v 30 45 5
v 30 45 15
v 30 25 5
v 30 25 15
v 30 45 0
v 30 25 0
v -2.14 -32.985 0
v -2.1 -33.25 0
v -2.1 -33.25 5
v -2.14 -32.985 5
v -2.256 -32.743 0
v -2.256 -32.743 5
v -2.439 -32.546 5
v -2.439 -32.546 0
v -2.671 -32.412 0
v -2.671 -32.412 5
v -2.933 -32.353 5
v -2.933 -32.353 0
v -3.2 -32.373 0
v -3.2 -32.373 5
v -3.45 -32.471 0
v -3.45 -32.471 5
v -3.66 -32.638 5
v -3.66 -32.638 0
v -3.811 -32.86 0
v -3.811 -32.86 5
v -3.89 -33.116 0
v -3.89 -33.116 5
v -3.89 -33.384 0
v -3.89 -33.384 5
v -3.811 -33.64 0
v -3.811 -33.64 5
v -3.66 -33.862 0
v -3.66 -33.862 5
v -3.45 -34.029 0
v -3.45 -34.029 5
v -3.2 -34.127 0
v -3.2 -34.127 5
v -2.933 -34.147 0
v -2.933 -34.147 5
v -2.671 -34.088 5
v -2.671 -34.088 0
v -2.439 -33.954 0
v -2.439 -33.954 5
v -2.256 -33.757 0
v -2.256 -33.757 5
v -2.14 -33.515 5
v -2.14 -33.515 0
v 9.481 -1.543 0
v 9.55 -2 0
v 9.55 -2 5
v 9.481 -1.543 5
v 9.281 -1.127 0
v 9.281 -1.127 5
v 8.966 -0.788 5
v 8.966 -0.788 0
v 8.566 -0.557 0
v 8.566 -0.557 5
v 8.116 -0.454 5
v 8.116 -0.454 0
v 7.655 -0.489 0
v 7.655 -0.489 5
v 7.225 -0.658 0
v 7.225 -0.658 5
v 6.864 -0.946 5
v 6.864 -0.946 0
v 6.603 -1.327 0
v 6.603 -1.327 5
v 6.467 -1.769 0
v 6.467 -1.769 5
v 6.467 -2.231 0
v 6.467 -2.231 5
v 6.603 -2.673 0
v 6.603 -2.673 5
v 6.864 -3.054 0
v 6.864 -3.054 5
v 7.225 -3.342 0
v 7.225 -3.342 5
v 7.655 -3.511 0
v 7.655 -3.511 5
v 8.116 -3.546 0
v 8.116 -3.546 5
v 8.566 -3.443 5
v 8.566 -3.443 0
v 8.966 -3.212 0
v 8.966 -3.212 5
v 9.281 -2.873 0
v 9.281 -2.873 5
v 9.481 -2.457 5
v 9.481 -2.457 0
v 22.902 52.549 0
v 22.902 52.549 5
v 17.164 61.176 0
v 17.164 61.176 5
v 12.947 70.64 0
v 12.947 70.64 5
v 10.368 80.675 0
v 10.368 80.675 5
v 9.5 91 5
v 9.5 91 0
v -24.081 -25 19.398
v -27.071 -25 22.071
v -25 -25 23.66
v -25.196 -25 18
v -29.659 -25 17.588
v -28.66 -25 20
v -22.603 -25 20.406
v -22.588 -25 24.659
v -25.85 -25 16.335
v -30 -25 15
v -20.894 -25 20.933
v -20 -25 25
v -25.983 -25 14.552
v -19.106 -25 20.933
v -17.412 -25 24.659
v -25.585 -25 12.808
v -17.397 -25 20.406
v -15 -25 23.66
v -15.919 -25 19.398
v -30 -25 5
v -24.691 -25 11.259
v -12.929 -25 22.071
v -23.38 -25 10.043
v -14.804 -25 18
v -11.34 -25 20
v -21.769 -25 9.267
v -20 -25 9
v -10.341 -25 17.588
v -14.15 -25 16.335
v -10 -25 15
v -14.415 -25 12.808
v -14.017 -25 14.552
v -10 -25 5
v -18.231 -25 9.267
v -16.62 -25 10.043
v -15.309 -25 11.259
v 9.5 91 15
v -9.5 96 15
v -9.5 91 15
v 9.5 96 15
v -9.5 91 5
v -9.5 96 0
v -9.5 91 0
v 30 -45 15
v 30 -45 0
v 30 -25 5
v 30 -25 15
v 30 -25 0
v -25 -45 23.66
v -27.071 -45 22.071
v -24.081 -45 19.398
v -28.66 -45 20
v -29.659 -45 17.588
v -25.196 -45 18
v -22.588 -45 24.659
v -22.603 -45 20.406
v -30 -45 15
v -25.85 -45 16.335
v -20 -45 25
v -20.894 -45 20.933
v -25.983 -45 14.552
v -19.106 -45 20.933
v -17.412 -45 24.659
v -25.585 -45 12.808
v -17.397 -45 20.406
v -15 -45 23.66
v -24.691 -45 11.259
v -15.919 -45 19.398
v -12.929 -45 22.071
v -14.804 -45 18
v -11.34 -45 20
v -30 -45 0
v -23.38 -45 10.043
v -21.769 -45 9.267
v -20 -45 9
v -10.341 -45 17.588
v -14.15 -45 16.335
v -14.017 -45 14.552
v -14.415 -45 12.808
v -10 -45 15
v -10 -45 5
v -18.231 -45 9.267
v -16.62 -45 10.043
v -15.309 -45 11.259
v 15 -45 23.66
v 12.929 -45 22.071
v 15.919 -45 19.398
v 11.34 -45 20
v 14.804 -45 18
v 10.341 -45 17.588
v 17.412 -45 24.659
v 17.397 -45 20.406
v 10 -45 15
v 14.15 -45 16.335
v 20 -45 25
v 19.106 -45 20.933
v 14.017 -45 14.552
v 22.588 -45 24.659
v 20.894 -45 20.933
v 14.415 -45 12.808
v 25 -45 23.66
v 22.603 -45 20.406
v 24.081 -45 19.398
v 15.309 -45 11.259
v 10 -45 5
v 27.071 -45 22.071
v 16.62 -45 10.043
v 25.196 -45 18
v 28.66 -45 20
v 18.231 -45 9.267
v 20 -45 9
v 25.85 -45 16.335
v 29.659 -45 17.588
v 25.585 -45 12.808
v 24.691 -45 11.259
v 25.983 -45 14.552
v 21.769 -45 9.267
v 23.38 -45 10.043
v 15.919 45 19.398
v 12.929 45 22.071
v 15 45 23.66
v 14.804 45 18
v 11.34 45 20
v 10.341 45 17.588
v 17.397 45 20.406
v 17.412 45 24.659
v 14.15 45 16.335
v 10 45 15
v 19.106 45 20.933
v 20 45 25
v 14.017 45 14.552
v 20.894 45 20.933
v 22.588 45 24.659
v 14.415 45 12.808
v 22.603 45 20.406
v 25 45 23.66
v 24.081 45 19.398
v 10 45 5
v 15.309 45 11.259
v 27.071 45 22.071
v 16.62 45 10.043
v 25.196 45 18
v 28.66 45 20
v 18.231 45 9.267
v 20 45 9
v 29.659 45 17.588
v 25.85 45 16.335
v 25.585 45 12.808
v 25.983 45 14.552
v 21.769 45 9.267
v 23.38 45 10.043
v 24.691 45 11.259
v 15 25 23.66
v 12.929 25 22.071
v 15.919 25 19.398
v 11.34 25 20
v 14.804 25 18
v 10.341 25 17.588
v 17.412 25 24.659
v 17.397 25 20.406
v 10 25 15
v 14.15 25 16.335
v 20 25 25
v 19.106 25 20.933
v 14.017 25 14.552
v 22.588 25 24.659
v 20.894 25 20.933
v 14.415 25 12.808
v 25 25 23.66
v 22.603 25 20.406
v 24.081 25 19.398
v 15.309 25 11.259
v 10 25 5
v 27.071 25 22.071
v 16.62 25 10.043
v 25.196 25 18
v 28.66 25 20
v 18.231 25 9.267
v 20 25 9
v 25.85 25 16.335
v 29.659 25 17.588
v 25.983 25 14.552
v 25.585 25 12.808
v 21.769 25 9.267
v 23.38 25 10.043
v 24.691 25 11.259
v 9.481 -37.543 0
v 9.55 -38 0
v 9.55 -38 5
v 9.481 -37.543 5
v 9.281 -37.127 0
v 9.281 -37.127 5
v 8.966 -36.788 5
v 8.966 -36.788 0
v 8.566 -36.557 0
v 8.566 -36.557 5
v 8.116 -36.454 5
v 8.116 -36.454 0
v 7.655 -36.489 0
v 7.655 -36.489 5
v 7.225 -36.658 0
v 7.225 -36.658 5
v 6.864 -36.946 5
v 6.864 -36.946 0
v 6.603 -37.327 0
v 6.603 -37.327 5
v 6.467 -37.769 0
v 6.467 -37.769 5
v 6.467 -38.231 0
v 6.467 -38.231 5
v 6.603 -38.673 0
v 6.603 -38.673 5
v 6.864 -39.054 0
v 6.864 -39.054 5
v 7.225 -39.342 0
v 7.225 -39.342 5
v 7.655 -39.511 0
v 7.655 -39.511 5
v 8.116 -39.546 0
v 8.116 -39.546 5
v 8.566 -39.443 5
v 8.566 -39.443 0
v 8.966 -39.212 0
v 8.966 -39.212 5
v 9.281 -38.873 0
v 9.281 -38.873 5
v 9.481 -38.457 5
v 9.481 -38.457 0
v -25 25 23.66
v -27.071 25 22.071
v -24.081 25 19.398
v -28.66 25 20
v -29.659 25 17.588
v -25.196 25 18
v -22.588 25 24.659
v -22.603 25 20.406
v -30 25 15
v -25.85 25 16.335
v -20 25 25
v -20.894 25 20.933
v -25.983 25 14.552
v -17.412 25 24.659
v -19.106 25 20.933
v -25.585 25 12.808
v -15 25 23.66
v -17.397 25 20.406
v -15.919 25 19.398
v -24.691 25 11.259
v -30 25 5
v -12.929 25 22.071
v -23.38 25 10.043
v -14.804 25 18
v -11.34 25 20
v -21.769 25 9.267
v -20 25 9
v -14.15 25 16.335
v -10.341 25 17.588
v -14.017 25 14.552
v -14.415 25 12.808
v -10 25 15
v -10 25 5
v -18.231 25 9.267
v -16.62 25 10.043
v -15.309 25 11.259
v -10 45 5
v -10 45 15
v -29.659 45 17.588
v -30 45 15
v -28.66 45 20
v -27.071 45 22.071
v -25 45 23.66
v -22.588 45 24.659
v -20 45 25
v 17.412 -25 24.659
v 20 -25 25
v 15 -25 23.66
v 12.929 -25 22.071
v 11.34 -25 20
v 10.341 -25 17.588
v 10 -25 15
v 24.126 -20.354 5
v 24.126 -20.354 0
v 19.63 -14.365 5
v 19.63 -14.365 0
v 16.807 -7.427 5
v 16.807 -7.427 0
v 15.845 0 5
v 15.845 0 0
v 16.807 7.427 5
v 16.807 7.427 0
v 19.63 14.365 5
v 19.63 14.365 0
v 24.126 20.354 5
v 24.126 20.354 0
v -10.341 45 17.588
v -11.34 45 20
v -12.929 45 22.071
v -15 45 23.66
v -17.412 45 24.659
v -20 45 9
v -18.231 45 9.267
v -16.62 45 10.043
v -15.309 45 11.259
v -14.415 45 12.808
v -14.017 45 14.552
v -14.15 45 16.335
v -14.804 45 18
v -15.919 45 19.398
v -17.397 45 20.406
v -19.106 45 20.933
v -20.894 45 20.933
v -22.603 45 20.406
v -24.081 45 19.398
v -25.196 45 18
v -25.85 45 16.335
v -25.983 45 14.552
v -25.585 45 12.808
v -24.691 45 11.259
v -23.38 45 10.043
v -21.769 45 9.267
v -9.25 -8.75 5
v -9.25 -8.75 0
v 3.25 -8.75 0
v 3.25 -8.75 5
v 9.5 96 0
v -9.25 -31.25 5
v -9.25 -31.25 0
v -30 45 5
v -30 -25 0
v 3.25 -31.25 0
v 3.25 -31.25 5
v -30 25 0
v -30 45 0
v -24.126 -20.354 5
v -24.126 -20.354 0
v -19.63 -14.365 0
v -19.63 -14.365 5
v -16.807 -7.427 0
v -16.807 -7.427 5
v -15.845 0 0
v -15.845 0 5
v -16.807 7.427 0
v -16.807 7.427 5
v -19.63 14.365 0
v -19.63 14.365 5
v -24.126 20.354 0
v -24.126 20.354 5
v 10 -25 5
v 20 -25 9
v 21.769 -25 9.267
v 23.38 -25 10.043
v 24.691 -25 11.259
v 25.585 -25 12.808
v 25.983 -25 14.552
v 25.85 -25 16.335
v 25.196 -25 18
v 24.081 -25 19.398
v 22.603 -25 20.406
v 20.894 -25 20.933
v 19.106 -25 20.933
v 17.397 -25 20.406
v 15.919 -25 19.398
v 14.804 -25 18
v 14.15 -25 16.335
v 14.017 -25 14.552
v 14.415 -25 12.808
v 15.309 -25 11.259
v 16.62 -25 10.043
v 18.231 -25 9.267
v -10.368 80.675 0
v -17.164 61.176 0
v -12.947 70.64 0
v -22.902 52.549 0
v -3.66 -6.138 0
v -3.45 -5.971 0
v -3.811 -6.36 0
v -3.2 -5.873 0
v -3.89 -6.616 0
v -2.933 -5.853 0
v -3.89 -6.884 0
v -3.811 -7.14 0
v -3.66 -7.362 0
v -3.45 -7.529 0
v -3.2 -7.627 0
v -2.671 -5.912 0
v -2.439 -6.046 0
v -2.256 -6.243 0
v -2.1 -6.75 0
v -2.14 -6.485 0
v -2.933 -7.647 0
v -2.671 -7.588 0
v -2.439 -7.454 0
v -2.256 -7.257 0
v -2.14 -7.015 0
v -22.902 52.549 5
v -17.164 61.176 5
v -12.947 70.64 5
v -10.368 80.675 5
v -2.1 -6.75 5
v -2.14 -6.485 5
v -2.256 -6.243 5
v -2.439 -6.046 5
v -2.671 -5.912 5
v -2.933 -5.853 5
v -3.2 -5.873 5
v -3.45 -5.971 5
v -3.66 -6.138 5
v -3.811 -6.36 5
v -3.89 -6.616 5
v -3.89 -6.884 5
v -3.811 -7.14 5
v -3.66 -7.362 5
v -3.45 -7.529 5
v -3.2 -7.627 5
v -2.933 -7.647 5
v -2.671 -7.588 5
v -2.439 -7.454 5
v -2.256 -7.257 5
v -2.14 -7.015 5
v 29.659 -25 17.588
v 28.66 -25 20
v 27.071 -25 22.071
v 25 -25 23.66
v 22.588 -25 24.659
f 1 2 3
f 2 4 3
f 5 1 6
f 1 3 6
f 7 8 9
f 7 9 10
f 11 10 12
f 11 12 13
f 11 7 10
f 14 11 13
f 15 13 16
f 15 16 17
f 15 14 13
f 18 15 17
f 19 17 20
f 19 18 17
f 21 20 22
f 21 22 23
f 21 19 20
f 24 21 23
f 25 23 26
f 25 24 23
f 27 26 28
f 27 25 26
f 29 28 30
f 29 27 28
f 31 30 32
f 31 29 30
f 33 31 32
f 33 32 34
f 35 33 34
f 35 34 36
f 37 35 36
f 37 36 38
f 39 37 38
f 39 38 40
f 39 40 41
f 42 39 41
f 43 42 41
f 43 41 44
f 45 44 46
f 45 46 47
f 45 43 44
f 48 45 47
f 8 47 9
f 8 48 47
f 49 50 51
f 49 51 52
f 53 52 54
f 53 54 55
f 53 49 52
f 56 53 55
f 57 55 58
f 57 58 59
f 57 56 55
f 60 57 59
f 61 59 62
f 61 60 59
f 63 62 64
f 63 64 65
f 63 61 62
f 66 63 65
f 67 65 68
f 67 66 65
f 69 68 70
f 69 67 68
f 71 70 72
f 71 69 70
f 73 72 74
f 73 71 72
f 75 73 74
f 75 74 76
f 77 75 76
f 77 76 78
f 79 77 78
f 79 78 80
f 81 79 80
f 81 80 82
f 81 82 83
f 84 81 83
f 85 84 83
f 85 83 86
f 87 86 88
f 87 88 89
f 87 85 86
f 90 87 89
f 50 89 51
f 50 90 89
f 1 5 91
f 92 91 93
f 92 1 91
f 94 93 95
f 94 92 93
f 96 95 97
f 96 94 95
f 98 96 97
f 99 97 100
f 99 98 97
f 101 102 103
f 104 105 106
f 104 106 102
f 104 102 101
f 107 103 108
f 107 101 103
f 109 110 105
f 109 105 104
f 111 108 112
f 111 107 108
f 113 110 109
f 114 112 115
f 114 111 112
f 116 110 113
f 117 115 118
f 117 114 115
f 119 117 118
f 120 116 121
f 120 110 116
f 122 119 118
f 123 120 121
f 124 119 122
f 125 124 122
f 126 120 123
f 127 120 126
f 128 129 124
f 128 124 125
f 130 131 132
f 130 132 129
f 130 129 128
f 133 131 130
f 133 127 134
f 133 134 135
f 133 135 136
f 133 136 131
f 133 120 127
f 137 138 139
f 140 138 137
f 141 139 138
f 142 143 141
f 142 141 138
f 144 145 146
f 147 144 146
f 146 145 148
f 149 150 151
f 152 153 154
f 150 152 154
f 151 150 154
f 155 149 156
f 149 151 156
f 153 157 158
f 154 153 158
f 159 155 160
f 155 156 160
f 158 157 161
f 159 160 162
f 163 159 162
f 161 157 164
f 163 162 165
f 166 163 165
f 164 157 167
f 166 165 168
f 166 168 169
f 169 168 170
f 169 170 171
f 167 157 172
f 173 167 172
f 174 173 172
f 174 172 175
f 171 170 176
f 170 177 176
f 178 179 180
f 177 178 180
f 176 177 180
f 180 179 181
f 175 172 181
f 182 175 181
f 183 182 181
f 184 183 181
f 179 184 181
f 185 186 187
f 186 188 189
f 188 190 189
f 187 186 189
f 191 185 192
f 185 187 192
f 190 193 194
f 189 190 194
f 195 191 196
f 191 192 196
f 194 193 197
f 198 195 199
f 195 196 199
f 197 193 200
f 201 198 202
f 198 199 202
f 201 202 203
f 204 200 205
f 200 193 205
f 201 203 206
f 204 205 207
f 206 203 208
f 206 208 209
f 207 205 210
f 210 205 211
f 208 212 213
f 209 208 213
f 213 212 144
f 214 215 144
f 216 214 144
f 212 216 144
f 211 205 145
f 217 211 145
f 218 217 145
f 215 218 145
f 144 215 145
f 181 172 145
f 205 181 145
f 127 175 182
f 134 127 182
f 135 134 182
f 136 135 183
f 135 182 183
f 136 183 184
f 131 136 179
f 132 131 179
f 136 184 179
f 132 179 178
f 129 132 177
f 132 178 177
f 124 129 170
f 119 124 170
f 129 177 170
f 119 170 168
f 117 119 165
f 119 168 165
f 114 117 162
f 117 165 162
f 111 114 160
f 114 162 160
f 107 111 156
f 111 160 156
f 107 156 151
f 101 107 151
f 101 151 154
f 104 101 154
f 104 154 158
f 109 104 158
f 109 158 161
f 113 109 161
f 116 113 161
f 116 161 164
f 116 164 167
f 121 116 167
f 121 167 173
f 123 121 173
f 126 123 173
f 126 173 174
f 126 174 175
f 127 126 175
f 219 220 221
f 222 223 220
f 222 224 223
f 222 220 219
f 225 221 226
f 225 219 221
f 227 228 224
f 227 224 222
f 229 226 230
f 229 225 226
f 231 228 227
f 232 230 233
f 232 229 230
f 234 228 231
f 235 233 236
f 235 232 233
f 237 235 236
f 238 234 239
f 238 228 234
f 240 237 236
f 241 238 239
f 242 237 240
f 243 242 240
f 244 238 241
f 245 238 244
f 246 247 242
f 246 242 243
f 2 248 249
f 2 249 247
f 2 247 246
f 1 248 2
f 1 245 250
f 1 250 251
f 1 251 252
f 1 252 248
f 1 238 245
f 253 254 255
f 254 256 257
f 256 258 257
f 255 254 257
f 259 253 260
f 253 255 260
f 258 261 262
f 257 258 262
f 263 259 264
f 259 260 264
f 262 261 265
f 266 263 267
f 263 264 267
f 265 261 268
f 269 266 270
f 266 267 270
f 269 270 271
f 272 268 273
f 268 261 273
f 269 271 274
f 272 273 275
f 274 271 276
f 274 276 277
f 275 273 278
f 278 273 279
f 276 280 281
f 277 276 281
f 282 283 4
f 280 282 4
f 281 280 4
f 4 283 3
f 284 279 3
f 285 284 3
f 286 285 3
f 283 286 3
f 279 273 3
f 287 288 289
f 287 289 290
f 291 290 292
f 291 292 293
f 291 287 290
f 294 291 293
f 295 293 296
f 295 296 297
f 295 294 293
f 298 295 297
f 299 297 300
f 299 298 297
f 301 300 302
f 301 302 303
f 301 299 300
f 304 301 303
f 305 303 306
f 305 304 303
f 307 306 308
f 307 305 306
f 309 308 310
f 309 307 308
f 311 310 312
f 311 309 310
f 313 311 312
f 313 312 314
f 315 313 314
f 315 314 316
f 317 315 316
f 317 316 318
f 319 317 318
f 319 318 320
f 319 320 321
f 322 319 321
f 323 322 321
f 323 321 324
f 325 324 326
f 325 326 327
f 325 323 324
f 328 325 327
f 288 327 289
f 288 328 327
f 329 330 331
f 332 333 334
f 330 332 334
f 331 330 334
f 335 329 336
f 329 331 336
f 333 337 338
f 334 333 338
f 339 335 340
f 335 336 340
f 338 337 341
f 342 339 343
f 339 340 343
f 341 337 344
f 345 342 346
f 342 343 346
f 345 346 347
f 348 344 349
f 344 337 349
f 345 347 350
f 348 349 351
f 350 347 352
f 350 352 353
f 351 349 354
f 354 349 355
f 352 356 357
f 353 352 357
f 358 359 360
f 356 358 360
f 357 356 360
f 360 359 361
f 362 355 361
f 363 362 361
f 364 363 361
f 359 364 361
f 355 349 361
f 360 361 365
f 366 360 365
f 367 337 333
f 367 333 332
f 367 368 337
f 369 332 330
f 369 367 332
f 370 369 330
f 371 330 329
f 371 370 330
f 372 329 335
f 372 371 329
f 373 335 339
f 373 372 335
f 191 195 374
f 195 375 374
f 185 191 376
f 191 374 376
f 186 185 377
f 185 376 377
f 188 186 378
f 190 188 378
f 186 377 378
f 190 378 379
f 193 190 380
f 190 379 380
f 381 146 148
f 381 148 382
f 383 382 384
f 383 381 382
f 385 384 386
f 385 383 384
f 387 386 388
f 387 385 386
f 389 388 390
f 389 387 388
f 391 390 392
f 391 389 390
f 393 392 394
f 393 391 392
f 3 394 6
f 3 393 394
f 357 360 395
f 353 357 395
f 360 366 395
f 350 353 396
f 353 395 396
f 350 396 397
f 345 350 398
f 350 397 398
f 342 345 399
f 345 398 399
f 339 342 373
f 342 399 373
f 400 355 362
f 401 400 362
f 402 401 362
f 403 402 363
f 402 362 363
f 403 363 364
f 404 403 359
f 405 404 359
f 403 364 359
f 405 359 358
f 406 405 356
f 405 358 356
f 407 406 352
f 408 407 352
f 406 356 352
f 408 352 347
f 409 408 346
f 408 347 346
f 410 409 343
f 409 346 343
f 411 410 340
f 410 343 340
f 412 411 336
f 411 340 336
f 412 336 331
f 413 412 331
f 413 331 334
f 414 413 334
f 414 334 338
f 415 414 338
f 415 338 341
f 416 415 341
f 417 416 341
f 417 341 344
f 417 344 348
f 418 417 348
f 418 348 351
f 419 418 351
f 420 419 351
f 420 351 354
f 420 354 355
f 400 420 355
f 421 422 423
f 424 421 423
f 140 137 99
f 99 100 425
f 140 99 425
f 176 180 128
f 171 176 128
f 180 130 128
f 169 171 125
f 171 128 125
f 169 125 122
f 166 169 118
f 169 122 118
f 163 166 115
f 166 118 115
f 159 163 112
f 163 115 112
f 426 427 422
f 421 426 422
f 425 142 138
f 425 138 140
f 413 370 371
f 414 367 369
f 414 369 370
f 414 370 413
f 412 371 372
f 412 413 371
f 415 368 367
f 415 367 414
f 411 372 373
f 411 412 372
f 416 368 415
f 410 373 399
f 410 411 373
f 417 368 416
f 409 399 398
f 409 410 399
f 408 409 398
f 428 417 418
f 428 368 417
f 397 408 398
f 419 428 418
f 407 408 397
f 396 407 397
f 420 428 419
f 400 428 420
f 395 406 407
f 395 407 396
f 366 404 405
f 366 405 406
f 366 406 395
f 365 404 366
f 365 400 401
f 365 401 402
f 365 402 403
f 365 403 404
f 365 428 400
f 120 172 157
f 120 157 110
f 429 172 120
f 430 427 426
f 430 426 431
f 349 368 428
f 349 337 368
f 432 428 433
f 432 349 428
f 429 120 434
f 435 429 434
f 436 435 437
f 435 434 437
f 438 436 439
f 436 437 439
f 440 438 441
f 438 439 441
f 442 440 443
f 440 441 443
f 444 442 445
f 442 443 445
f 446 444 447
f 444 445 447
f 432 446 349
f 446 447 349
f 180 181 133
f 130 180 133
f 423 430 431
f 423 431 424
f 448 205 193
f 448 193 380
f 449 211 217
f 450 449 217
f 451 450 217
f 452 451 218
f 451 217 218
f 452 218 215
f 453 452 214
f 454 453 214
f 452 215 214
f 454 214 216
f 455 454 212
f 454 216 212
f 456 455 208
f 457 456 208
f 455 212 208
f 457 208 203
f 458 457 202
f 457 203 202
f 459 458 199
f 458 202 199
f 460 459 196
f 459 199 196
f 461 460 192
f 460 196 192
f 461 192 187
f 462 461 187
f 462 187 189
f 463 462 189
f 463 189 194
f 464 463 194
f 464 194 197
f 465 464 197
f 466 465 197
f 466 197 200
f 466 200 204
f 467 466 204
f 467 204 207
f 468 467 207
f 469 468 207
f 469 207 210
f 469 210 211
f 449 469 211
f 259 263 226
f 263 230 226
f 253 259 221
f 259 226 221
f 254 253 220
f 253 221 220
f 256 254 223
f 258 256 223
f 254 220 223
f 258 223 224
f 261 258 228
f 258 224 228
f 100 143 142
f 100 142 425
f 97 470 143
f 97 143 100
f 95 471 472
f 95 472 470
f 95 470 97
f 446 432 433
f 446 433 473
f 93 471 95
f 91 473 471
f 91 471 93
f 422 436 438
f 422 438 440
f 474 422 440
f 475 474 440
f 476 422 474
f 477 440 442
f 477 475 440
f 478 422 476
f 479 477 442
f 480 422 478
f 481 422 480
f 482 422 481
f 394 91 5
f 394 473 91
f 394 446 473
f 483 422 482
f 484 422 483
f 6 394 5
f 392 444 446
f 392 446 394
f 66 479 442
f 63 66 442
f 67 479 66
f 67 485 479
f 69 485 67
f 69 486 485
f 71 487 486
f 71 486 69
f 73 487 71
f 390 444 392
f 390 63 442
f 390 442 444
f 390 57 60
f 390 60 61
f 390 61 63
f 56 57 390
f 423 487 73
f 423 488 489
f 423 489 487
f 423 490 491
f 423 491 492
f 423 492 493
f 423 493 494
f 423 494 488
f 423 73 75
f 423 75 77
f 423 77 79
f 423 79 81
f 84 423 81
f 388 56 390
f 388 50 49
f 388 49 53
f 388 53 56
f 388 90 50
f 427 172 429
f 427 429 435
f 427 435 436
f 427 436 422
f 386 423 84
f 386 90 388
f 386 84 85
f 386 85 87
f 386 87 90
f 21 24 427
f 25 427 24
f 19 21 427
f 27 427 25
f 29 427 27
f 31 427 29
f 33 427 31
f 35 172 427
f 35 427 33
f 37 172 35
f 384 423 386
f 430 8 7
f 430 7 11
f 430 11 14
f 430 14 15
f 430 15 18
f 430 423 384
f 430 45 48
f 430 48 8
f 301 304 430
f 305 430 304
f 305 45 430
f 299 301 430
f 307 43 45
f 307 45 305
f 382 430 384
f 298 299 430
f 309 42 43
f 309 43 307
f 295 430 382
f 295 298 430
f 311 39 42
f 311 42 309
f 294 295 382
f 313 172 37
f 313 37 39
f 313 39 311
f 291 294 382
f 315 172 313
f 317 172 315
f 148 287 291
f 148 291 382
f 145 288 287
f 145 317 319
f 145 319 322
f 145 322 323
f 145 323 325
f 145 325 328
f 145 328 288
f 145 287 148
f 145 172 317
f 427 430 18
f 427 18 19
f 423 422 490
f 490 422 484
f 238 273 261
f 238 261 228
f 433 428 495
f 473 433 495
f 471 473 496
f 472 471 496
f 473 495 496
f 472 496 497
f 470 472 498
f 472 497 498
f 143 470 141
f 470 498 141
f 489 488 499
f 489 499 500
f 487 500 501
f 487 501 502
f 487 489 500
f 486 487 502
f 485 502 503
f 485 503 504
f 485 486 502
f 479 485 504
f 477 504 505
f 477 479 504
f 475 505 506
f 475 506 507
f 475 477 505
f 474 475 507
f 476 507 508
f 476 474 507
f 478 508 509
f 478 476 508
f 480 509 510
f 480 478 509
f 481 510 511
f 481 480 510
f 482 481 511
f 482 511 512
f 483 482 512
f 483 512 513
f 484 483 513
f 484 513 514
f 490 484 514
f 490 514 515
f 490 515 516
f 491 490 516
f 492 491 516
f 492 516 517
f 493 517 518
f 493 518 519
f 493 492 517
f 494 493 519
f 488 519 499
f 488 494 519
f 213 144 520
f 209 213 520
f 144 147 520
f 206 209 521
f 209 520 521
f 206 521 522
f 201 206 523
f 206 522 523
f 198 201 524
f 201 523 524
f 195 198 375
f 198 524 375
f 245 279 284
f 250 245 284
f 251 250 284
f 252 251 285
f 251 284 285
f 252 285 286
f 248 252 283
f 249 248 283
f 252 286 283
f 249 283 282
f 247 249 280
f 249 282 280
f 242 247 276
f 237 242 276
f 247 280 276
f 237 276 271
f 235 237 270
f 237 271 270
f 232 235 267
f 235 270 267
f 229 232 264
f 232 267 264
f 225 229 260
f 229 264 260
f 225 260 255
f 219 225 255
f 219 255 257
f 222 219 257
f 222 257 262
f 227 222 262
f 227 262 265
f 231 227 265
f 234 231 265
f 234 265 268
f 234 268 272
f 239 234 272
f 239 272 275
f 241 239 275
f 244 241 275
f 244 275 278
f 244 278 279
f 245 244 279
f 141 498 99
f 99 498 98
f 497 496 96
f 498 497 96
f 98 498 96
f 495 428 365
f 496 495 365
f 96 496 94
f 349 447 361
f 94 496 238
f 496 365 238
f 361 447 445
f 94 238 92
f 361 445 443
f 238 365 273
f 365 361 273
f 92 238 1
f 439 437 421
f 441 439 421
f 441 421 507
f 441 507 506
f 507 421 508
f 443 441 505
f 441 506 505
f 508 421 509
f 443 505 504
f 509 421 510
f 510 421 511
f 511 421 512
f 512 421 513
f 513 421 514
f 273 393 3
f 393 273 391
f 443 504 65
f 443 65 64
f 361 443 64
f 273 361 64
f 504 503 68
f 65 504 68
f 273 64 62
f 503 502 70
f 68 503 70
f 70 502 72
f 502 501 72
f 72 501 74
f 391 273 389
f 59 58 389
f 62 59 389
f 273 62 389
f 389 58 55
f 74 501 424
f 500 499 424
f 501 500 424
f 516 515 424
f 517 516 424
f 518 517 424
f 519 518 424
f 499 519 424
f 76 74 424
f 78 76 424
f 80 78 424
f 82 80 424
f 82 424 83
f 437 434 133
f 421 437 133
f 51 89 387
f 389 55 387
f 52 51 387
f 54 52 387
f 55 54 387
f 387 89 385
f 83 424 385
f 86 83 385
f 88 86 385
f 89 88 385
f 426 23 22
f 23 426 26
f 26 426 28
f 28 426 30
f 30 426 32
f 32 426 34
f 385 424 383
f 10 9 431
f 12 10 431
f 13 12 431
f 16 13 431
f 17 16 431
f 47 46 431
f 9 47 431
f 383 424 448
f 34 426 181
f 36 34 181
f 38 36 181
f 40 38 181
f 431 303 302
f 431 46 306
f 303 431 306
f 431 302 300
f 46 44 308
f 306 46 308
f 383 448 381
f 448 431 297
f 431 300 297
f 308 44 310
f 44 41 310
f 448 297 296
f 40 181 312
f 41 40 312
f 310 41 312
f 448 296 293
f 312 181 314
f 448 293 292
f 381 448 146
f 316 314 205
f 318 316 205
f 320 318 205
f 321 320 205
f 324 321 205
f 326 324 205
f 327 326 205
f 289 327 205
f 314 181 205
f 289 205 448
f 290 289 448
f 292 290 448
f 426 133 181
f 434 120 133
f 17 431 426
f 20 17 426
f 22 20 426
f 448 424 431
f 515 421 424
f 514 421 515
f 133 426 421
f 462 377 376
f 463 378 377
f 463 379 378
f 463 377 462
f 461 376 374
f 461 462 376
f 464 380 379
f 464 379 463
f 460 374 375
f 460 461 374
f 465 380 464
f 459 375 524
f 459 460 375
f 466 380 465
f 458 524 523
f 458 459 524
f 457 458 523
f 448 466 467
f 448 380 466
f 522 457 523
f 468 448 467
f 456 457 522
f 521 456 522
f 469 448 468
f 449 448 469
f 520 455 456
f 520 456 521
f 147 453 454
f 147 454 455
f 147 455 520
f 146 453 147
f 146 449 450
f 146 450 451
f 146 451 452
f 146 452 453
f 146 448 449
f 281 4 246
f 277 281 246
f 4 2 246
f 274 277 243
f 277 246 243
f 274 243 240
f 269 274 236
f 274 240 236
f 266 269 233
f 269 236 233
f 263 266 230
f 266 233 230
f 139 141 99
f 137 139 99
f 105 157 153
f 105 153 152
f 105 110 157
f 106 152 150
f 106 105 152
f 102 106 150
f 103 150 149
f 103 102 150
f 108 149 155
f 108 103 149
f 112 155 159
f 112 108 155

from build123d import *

# Parameters (mm, degrees)
SKETCH1_W           = 60
SKETCH1_H           = 90
SKETCH1_R           = 0.9
SKETCH1_R_2         = 1.55
SKETCH1_W_2         = 12.5
SKETCH1_H_2         = 22.5
BOSS_EXTRUDE1_DEPTH = 5
SKETCH2_W           = 20
SKETCH2_H           = 20
BOSS_EXTRUDE2_DEPTH = 20
FILLET1_R           = 10
SKETCH3_R           = 6
CUT_EXTRUDE1_DEPTH  = 99.107084352
CUT_EXTRUDE2_REACH  = 59.663
SKETCH5_W           = 60
SKETCH5_H           = 5
BOSS_EXTRUDE3_DEPTH = 51
CUT_EXTRUDE3_REACH  = 104.548
SKETCH7_W           = 19
SKETCH7_H           = 5
BOSS_EXTRUDE4_DEPTH = 10


with BuildPart() as part:
    # Sketch1 → Boss-Extrude1 (new body)
    with BuildSketch(Plane.XY):
        Rectangle(SKETCH1_W, SKETCH1_H)
        with Locations((-3, -33.25)):
            Circle(SKETCH1_R, mode=Mode.SUBTRACT)
        with Locations((-3, -6.75)):
            Circle(SKETCH1_R, mode=Mode.SUBTRACT)
        with Locations((8, -38)):
            Circle(SKETCH1_R_2, mode=Mode.SUBTRACT)
        with Locations((8, -2)):
            Circle(SKETCH1_R_2, mode=Mode.SUBTRACT)
        with Locations((-3, -20)):
            Rectangle(SKETCH1_W_2, SKETCH1_H_2, mode=Mode.SUBTRACT)
    extrude(amount=BOSS_EXTRUDE1_DEPTH)

    # Sketch2 → Boss-Extrude2 (add)
    with BuildSketch(Plane.XY.offset(5)):
        with Locations((-20, -35)):
            Rectangle(SKETCH2_W, SKETCH2_H)
        with Locations((-20, 35)):
            Rectangle(SKETCH2_W, SKETCH2_H)
        with Locations((20, 35)):
            Rectangle(SKETCH2_W, SKETCH2_H)
        with Locations((20, -35)):
            Rectangle(SKETCH2_W, SKETCH2_H)
    extrude(amount=BOSS_EXTRUDE2_DEPTH)

    # Fillet1
    fillet1_edges = [part.edges().sort_by_distance(p)[0] for p in [
        (10, -35, 25),
        (30, -35, 25),
        (30, 35, 25),
        (10, 35, 25),
        (-30, 35, 25),
        (-10, 35, 25),
        (-10, -35, 25),
        (-30, -35, 25),
    ]]
    fillet(fillet1_edges, radius=FILLET1_R - 0.0001)  # a hair under: the kernel refuses the full size

    # Sketch3 → Cut-Extrude1 (cut, through all)
    with BuildSketch(Plane.XZ.offset(45)):
        with Locations(Location((-20, 15, 0), (0, 0, 270))):
            Circle(SKETCH3_R)
        with Locations(Location((20, 15, 0), (0, 0, 270))):
            Circle(SKETCH3_R)
    extrude(amount=-CUT_EXTRUDE1_DEPTH, mode=Mode.SUBTRACT)

    # Sketch4 → Cut-Extrude2 (cut, up to next)
    with BuildSketch(Plane.XY.offset(5), mode=Mode.PRIVATE) as cut_extrude2_sk1:
        with BuildLine():
            Line((-30, 25), (-30, -25))
            ThreePointArc((-30, -25), (-15.845240526, 0), (-30, 25))
        make_face()
    cut_extrude2_tool1 = extrude(cut_extrude2_sk1.sketch, amount=-CUT_EXTRUDE2_REACH, mode=Mode.PRIVATE) & part.part
    # Sketch4 → Cut-Extrude2 (cut, up to next)
    with BuildSketch(Plane.XY.offset(5), mode=Mode.PRIVATE) as cut_extrude2_sk2:
        with BuildLine():
            Line((30, 25), (30, -25))
            ThreePointArc((30, -25), (15.845240526, 0), (30, 25))
        make_face()
    cut_extrude2_tool2 = extrude(cut_extrude2_sk2.sketch, amount=-CUT_EXTRUDE2_REACH, mode=Mode.PRIVATE) & part.part
    add(cut_extrude2_tool1.solids().sort_by_distance((-24.20079, 0, 5))[0], mode=Mode.SUBTRACT)
    add(cut_extrude2_tool2.solids().sort_by_distance((24.20079, 0, 5))[0], mode=Mode.SUBTRACT)

    # Sketch5 → Boss-Extrude3 (add)
    with BuildSketch(Plane(origin=(0, 45, 0), x_dir=(1, 0, 0), z_dir=(0, 1, 0))):
        with Locations((0, -2.5)):
            Rectangle(SKETCH5_W, SKETCH5_H)
    extrude(amount=BOSS_EXTRUDE3_DEPTH)

    # Sketch6 → Cut-Extrude3 (cut, up to next)
    with BuildSketch(Plane.XY.offset(5), mode=Mode.PRIVATE) as cut_extrude3_sk1:
        with BuildLine():
            Line((-9.5, 91), (-9.5, 96))
            Line((-9.5, 96), (-30, 96))
            Line((-30, 96), (-30, 45))
            ThreePointArc((-30, 45), (-14.856951526, 65.819402311), (-9.5, 91))
        make_face()
    cut_extrude3_tool1 = extrude(cut_extrude3_sk1.sketch, amount=-CUT_EXTRUDE3_REACH, mode=Mode.PRIVATE) & part.part
    # Sketch6 → Cut-Extrude3 (cut, up to next)
    with BuildSketch(Plane.XY.offset(5), mode=Mode.PRIVATE) as cut_extrude3_sk2:
        with BuildLine():
            Line((9.5, 91), (9.5, 96))
            Line((9.5, 96), (30, 96))
            Line((30, 96), (30, 45))
            ThreePointArc((30, 45), (14.856951526, 65.819402311), (9.5, 91))
        make_face()
    cut_extrude3_tool2 = extrude(cut_extrude3_sk2.sketch, amount=-CUT_EXTRUDE3_REACH, mode=Mode.PRIVATE) & part.part
    add(cut_extrude3_tool1.solids().sort_by_distance((-21.41045, 76.034299, 5))[0], mode=Mode.SUBTRACT)
    add(cut_extrude3_tool2.solids().sort_by_distance((21.41045, 76.034299, 5))[0], mode=Mode.SUBTRACT)

    # Sketch7 → Boss-Extrude4 (add)
    with BuildSketch(Plane.XY.offset(5)):
        with Locations((0, 93.5)):
            Rectangle(SKETCH7_W, SKETCH7_H)
    extrude(amount=BOSS_EXTRUDE4_DEPTH)


solid = part.part
